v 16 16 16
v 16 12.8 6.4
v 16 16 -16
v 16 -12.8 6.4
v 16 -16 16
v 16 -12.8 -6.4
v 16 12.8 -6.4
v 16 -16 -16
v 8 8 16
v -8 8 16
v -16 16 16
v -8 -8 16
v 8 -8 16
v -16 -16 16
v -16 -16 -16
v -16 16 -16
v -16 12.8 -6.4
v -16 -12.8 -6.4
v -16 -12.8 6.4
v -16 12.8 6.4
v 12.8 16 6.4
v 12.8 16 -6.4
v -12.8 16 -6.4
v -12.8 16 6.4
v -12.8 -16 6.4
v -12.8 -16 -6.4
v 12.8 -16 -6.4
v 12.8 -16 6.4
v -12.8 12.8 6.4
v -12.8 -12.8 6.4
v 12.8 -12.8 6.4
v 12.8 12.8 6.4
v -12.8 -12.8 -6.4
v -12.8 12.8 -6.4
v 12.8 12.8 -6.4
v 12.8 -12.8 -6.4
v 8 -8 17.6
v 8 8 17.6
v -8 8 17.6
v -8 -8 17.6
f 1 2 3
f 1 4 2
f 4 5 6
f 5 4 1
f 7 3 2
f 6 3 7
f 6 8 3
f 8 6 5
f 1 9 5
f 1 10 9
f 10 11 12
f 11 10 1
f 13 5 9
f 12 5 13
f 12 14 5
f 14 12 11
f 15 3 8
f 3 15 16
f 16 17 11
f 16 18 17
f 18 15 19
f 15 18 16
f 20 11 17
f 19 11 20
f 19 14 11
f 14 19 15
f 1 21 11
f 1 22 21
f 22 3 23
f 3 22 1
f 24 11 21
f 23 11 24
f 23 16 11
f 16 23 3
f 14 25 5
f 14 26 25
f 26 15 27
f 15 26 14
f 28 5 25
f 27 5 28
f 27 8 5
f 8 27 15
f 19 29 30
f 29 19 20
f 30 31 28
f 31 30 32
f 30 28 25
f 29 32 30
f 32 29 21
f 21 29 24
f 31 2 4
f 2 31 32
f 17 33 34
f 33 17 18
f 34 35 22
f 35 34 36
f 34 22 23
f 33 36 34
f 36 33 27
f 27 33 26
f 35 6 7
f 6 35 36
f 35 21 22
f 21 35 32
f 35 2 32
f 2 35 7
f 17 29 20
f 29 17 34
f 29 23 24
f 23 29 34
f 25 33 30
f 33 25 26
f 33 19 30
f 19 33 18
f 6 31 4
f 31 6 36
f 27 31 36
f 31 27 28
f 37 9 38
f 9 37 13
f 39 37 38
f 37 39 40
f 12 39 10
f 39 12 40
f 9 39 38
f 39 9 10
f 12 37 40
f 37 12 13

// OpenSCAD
size = 32;//block=32 //item=8

difference() {
  cube([size * 1, size * 1, size * 1], center = true);
  cube([size * 1.1, size * 1.1, size * 0.4], center = true);
}
;

for(i = [0:1:4]) {
  rotate([0, 0, 90 * i]) {
    translate([size * 0.45, size * 0.45, 0]) {
      cube([size * 0.1, size * 0.1, size * 1], center = true);

    }
    ;//translate
  }
  ;//rotate
}
;//for


translate([0, 0, size * 0.45]) {

  cube([size * 0.5, size * 0.5, size * 0.20], center = true);

}
;//translate
